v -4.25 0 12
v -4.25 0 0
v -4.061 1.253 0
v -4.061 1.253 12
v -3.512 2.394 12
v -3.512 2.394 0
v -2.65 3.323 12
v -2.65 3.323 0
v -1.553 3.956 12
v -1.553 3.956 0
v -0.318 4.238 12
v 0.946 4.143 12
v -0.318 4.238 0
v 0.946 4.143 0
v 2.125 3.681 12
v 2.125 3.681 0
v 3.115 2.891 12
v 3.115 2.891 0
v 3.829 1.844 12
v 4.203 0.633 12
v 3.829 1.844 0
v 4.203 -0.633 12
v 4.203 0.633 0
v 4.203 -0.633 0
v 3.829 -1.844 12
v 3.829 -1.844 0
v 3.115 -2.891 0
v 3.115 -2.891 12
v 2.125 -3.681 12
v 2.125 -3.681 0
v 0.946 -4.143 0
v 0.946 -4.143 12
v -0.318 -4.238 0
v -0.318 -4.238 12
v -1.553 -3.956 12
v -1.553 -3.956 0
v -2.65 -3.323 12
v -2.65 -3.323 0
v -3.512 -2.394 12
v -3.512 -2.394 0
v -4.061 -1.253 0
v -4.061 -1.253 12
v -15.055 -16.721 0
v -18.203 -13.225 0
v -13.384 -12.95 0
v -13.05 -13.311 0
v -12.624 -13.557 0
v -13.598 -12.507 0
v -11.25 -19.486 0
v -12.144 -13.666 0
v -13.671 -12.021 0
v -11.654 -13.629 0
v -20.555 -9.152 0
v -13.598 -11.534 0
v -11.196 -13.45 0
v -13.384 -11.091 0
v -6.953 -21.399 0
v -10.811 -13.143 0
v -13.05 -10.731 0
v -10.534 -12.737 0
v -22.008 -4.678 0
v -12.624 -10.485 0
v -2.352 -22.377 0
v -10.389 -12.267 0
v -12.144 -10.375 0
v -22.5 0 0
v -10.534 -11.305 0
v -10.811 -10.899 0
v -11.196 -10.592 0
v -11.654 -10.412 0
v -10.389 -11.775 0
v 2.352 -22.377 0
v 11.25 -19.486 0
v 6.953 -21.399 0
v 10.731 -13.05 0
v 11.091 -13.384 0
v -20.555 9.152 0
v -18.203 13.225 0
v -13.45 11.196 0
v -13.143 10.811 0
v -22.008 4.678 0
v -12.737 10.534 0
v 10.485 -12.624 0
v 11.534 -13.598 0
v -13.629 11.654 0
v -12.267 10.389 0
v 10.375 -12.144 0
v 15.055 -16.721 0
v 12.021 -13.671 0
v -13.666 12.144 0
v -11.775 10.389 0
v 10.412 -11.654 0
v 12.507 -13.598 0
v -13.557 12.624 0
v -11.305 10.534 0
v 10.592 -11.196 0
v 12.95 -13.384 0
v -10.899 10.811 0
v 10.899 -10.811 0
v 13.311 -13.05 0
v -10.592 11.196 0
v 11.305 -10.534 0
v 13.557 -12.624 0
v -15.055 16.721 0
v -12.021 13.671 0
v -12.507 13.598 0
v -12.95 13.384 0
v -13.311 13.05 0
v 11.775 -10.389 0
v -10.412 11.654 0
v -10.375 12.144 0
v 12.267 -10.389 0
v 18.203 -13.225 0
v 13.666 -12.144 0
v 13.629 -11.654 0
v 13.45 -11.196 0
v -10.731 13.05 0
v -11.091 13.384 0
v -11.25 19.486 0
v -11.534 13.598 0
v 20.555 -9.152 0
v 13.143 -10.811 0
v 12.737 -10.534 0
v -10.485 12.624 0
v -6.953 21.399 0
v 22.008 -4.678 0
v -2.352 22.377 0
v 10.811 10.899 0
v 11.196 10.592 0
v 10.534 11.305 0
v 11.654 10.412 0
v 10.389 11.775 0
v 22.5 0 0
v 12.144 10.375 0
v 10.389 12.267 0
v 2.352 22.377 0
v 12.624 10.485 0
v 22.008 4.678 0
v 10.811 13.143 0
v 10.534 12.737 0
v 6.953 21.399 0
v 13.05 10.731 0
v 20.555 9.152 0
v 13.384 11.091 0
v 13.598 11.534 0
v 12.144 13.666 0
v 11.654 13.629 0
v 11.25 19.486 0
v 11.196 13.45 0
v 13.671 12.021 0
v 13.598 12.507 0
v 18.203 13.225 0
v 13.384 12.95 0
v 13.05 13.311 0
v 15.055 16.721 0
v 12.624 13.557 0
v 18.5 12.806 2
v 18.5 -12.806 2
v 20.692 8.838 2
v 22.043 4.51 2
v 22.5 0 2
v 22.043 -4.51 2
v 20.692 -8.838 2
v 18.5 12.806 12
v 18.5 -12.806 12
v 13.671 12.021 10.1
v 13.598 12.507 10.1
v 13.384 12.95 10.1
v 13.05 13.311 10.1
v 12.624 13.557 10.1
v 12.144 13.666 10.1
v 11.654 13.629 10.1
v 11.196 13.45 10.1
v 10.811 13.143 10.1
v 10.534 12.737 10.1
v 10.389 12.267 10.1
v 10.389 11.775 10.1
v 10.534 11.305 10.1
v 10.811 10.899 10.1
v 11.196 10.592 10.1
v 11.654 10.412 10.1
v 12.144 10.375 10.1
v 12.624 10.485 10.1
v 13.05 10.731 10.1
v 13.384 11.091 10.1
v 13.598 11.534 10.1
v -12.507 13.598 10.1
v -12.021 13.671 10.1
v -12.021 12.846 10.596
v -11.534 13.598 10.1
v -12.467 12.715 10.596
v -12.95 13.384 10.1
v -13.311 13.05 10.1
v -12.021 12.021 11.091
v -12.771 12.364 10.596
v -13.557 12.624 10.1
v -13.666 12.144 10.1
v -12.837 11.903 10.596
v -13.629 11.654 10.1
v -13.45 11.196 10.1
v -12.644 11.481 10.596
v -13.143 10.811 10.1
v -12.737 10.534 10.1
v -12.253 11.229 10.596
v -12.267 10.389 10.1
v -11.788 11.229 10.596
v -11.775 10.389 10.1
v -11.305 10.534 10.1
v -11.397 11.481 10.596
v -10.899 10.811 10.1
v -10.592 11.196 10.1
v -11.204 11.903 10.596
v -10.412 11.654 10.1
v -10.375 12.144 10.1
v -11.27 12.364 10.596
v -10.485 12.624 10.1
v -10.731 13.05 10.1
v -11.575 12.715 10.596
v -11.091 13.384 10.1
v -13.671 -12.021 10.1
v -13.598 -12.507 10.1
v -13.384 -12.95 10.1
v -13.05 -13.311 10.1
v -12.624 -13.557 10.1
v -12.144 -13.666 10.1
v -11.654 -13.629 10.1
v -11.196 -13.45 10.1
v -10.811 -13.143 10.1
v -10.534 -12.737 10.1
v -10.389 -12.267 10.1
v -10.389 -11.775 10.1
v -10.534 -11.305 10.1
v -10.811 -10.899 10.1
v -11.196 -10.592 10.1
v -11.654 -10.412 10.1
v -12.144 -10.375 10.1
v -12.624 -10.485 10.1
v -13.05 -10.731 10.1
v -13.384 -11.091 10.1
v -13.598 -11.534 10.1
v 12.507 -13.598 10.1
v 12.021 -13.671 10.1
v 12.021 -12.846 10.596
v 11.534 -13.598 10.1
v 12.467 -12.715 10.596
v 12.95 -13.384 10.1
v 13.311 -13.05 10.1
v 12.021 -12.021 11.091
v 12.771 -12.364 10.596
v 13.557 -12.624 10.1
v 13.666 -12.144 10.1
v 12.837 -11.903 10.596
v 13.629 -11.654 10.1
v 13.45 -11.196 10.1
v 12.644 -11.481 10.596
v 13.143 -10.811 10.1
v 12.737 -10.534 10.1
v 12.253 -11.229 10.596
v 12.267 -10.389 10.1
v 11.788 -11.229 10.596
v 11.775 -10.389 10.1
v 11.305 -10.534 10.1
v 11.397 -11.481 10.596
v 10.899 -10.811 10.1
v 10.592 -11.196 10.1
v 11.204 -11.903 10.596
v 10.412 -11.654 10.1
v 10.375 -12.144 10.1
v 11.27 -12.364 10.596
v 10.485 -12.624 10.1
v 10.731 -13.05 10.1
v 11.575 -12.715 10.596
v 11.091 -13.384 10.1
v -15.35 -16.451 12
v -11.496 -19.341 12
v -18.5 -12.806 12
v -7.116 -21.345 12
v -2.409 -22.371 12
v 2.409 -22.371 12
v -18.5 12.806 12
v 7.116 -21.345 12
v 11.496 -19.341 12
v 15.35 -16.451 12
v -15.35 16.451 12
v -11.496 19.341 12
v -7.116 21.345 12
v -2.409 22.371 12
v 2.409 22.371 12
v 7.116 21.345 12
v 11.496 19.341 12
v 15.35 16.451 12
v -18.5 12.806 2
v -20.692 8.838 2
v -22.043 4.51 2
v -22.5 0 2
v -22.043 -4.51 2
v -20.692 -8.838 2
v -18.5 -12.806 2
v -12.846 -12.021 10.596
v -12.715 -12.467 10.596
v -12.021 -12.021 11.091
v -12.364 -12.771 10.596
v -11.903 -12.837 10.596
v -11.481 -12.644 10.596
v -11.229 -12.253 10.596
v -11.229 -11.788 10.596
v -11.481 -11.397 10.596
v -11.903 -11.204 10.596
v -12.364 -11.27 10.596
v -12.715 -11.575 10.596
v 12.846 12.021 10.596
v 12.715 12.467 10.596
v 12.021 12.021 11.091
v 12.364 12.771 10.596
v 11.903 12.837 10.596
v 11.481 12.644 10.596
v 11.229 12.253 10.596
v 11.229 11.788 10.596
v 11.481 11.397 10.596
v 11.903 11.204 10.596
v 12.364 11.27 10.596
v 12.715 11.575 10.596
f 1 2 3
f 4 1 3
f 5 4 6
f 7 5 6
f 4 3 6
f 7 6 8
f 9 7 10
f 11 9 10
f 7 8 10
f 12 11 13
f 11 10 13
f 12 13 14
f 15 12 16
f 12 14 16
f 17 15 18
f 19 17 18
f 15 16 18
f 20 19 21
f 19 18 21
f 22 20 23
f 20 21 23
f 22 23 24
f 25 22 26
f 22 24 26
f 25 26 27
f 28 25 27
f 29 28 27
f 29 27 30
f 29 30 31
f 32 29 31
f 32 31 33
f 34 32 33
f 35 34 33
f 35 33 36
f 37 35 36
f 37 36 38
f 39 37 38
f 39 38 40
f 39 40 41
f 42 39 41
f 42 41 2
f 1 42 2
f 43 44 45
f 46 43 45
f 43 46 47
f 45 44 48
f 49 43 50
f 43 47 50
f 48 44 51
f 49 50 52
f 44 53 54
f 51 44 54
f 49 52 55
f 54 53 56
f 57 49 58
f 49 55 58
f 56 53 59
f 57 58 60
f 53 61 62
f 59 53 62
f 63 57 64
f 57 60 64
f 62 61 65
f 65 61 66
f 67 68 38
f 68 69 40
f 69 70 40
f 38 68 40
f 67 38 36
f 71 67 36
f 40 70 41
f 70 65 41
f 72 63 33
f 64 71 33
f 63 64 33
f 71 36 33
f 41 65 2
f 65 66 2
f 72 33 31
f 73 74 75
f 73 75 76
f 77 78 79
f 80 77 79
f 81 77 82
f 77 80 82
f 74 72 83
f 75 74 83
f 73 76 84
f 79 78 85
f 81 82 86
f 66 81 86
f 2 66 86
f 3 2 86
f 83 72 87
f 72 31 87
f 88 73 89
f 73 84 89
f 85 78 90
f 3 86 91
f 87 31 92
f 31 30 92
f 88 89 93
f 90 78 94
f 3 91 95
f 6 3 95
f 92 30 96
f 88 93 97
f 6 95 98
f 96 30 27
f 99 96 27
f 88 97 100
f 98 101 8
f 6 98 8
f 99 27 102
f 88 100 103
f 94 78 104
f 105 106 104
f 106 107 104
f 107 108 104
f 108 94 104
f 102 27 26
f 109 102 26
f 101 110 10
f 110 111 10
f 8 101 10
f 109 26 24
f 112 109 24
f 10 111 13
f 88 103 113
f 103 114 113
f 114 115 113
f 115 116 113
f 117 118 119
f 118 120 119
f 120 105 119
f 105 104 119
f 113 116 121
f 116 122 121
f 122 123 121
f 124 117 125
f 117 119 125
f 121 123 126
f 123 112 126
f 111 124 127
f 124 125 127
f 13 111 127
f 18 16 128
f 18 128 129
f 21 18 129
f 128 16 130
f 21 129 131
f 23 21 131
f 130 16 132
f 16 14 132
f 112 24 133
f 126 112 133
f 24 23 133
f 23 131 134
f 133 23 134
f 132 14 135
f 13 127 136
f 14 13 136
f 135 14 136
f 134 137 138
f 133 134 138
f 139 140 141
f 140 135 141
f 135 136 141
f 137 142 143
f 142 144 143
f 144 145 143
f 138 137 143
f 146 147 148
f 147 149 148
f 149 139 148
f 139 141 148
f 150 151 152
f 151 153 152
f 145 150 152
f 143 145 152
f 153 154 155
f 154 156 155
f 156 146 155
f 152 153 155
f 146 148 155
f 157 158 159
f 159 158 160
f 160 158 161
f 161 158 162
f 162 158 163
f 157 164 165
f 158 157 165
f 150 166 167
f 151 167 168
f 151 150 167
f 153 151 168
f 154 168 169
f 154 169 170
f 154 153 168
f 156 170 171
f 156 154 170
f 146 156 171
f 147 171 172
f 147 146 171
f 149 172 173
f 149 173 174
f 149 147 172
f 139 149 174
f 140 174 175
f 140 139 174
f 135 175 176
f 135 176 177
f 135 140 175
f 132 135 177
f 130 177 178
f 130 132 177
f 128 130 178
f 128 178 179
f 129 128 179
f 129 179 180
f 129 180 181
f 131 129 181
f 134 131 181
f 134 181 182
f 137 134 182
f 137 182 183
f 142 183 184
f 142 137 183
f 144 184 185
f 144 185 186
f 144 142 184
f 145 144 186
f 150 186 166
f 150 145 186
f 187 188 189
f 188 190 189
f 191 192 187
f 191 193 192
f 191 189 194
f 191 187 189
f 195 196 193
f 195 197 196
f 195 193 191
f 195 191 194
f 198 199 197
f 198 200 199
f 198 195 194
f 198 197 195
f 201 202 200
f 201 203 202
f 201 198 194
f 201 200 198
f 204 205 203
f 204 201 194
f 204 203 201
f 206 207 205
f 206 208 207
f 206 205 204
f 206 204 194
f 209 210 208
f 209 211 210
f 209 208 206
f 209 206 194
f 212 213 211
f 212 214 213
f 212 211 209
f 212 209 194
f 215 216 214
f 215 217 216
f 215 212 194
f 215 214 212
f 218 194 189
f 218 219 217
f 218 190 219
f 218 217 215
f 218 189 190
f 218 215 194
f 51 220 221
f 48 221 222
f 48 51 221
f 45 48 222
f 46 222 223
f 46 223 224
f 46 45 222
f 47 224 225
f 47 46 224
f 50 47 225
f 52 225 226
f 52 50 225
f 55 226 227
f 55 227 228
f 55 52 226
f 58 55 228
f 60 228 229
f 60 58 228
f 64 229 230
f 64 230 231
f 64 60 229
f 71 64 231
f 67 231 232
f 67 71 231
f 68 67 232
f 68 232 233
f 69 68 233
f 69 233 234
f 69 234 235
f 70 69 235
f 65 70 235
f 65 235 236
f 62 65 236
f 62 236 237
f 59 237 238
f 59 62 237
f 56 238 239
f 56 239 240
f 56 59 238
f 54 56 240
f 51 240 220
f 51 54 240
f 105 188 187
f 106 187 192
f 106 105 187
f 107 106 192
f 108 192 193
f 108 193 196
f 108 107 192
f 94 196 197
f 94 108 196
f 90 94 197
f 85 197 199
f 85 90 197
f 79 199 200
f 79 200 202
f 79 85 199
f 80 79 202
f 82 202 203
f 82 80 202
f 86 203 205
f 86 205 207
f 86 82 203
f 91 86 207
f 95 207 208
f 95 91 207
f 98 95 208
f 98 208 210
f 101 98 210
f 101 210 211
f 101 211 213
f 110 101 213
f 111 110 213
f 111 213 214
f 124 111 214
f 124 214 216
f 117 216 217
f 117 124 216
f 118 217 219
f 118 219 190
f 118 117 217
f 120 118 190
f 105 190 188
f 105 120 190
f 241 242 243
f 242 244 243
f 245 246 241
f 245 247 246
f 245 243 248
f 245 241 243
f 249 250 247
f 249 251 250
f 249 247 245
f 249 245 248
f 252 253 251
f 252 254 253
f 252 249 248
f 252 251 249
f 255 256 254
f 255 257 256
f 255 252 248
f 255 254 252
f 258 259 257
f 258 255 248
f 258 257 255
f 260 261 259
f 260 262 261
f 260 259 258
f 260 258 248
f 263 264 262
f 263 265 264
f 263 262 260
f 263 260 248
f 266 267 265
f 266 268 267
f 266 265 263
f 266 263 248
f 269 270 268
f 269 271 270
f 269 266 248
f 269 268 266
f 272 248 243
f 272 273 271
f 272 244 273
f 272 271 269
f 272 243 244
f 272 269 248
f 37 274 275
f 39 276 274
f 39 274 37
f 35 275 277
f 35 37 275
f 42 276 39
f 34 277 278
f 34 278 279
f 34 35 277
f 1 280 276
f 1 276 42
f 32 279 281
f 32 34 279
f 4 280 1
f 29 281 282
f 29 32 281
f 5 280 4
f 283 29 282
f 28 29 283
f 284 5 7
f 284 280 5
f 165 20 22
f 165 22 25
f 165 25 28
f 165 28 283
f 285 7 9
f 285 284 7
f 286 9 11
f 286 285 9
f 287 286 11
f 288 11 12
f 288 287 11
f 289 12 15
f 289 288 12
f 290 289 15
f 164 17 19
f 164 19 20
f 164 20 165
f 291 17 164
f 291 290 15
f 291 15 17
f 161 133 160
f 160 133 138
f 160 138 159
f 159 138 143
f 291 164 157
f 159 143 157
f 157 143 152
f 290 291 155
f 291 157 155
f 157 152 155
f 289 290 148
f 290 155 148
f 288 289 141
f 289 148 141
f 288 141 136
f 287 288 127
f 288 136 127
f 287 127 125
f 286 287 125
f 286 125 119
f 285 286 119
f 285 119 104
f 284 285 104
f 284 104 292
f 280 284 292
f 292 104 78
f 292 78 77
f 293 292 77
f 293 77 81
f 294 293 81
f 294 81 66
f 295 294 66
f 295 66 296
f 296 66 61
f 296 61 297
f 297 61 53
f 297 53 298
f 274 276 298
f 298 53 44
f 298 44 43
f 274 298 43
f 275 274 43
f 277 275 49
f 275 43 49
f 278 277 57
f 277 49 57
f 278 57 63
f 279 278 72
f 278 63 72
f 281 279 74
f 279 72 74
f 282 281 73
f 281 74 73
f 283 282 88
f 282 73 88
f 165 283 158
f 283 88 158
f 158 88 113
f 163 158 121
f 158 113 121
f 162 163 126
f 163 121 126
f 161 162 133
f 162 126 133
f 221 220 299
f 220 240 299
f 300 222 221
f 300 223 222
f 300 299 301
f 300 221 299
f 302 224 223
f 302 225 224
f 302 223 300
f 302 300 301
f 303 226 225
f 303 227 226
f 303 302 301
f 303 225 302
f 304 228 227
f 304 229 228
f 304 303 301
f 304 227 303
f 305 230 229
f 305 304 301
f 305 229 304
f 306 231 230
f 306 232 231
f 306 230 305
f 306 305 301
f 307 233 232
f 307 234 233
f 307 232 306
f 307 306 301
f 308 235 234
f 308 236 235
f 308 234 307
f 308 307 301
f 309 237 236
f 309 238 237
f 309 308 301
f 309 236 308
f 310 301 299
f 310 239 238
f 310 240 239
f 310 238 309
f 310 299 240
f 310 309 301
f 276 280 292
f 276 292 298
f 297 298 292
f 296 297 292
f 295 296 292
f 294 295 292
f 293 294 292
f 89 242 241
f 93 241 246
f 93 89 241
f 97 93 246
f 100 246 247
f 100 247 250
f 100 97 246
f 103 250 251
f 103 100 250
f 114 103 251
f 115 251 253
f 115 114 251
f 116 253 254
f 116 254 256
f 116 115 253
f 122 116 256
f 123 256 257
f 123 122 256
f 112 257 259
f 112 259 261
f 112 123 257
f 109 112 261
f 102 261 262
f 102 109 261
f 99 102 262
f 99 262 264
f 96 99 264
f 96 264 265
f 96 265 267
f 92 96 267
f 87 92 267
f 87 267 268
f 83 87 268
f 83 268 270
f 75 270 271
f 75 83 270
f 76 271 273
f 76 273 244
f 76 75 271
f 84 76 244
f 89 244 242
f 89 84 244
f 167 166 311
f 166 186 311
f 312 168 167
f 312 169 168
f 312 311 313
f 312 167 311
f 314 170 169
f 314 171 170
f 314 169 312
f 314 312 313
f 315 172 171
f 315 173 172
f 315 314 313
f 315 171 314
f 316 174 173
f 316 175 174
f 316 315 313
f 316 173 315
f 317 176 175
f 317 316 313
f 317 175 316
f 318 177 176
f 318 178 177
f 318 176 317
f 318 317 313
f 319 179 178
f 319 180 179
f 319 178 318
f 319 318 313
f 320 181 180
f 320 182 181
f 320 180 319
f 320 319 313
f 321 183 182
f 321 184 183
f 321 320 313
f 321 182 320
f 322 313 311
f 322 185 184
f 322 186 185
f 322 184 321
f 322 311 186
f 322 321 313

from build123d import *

# Parameters (mm, degrees)
SKETCH_1_R               = 22.5
EXTRUDE_1_DEPTH          = 12
CUT_EXTRUDE_1_DEPTH      = 10
HOLE_WIZARD_M10_1_D      = 8.5
HOLE_WIZARD_M10_1_DEPTH  = 24.5
HOLE_WIZARD_M10_1_TIP    = 2.553657631
PATTERN_CIRCULAR_1_COUNT = 4


with BuildPart() as part:
    # 草图1 → 凸台-拉伸1 (new body)
    with BuildSketch(Plane.XY):
        Circle(SKETCH_1_R)
    extrude(amount=EXTRUDE_1_DEPTH)

    # 草图2 → 切除-拉伸1 (cut)
    with BuildSketch(Plane.XY.offset(12)):
        with BuildLine():
            Line((-18.5, 12.806248475), (-18.5, -12.806248475))
            ThreePointArc((-18.5, -12.806248475), (-22.5, 0), (-18.5, 12.806248475))
        make_face()
        with BuildLine():
            Line((18.5, 12.806248475), (18.5, -12.806248475))
            ThreePointArc((18.5, -12.806248475), (22.5, 0), (18.5, 12.806248475))
        make_face()
    extrude(amount=-CUT_EXTRUDE_1_DEPTH, mode=Mode.SUBTRACT)

    # M10 螺纹孔1
    with Locations(Plane.XY.offset(12)):
        with Locations((0, 0)):
            Hole(HOLE_WIZARD_M10_1_D / 2, depth=HOLE_WIZARD_M10_1_DEPTH)
            with Locations((0, 0, -(HOLE_WIZARD_M10_1_DEPTH + HOLE_WIZARD_M10_1_TIP / 2))):  # 118° drill point
                Cone(0, HOLE_WIZARD_M10_1_D / 2, HOLE_WIZARD_M10_1_TIP, mode=Mode.SUBTRACT)

    # 草图7 → M4 螺纹孔2 (revolve, cut)
    with BuildSketch(Plane(origin=(-12.02081528, 12.02081528, 0), x_dir=(0, 1, 0), z_dir=(1, 0, 0))):
        Polygon((0, 0), (0, 11.091420021), (1.65, 10.1), (1.65, 0), align=None)
    hole_wizard_m4_2 = revolve(axis=Axis((-12.02081528, 12.02081528, -6.35), (0, 0, 1)), mode=Mode.SUBTRACT)

    # 阵列(圆周)1: M4 螺纹孔2 ×4 about axis
    pattern_circular_1_axis = Axis((0, 0, 0), (0, 0, 1))
    for i in range(1, PATTERN_CIRCULAR_1_COUNT):
        add(hole_wizard_m4_2.rotate(pattern_circular_1_axis, i * 360 / PATTERN_CIRCULAR_1_COUNT), mode=Mode.SUBTRACT)


solid = part.part
